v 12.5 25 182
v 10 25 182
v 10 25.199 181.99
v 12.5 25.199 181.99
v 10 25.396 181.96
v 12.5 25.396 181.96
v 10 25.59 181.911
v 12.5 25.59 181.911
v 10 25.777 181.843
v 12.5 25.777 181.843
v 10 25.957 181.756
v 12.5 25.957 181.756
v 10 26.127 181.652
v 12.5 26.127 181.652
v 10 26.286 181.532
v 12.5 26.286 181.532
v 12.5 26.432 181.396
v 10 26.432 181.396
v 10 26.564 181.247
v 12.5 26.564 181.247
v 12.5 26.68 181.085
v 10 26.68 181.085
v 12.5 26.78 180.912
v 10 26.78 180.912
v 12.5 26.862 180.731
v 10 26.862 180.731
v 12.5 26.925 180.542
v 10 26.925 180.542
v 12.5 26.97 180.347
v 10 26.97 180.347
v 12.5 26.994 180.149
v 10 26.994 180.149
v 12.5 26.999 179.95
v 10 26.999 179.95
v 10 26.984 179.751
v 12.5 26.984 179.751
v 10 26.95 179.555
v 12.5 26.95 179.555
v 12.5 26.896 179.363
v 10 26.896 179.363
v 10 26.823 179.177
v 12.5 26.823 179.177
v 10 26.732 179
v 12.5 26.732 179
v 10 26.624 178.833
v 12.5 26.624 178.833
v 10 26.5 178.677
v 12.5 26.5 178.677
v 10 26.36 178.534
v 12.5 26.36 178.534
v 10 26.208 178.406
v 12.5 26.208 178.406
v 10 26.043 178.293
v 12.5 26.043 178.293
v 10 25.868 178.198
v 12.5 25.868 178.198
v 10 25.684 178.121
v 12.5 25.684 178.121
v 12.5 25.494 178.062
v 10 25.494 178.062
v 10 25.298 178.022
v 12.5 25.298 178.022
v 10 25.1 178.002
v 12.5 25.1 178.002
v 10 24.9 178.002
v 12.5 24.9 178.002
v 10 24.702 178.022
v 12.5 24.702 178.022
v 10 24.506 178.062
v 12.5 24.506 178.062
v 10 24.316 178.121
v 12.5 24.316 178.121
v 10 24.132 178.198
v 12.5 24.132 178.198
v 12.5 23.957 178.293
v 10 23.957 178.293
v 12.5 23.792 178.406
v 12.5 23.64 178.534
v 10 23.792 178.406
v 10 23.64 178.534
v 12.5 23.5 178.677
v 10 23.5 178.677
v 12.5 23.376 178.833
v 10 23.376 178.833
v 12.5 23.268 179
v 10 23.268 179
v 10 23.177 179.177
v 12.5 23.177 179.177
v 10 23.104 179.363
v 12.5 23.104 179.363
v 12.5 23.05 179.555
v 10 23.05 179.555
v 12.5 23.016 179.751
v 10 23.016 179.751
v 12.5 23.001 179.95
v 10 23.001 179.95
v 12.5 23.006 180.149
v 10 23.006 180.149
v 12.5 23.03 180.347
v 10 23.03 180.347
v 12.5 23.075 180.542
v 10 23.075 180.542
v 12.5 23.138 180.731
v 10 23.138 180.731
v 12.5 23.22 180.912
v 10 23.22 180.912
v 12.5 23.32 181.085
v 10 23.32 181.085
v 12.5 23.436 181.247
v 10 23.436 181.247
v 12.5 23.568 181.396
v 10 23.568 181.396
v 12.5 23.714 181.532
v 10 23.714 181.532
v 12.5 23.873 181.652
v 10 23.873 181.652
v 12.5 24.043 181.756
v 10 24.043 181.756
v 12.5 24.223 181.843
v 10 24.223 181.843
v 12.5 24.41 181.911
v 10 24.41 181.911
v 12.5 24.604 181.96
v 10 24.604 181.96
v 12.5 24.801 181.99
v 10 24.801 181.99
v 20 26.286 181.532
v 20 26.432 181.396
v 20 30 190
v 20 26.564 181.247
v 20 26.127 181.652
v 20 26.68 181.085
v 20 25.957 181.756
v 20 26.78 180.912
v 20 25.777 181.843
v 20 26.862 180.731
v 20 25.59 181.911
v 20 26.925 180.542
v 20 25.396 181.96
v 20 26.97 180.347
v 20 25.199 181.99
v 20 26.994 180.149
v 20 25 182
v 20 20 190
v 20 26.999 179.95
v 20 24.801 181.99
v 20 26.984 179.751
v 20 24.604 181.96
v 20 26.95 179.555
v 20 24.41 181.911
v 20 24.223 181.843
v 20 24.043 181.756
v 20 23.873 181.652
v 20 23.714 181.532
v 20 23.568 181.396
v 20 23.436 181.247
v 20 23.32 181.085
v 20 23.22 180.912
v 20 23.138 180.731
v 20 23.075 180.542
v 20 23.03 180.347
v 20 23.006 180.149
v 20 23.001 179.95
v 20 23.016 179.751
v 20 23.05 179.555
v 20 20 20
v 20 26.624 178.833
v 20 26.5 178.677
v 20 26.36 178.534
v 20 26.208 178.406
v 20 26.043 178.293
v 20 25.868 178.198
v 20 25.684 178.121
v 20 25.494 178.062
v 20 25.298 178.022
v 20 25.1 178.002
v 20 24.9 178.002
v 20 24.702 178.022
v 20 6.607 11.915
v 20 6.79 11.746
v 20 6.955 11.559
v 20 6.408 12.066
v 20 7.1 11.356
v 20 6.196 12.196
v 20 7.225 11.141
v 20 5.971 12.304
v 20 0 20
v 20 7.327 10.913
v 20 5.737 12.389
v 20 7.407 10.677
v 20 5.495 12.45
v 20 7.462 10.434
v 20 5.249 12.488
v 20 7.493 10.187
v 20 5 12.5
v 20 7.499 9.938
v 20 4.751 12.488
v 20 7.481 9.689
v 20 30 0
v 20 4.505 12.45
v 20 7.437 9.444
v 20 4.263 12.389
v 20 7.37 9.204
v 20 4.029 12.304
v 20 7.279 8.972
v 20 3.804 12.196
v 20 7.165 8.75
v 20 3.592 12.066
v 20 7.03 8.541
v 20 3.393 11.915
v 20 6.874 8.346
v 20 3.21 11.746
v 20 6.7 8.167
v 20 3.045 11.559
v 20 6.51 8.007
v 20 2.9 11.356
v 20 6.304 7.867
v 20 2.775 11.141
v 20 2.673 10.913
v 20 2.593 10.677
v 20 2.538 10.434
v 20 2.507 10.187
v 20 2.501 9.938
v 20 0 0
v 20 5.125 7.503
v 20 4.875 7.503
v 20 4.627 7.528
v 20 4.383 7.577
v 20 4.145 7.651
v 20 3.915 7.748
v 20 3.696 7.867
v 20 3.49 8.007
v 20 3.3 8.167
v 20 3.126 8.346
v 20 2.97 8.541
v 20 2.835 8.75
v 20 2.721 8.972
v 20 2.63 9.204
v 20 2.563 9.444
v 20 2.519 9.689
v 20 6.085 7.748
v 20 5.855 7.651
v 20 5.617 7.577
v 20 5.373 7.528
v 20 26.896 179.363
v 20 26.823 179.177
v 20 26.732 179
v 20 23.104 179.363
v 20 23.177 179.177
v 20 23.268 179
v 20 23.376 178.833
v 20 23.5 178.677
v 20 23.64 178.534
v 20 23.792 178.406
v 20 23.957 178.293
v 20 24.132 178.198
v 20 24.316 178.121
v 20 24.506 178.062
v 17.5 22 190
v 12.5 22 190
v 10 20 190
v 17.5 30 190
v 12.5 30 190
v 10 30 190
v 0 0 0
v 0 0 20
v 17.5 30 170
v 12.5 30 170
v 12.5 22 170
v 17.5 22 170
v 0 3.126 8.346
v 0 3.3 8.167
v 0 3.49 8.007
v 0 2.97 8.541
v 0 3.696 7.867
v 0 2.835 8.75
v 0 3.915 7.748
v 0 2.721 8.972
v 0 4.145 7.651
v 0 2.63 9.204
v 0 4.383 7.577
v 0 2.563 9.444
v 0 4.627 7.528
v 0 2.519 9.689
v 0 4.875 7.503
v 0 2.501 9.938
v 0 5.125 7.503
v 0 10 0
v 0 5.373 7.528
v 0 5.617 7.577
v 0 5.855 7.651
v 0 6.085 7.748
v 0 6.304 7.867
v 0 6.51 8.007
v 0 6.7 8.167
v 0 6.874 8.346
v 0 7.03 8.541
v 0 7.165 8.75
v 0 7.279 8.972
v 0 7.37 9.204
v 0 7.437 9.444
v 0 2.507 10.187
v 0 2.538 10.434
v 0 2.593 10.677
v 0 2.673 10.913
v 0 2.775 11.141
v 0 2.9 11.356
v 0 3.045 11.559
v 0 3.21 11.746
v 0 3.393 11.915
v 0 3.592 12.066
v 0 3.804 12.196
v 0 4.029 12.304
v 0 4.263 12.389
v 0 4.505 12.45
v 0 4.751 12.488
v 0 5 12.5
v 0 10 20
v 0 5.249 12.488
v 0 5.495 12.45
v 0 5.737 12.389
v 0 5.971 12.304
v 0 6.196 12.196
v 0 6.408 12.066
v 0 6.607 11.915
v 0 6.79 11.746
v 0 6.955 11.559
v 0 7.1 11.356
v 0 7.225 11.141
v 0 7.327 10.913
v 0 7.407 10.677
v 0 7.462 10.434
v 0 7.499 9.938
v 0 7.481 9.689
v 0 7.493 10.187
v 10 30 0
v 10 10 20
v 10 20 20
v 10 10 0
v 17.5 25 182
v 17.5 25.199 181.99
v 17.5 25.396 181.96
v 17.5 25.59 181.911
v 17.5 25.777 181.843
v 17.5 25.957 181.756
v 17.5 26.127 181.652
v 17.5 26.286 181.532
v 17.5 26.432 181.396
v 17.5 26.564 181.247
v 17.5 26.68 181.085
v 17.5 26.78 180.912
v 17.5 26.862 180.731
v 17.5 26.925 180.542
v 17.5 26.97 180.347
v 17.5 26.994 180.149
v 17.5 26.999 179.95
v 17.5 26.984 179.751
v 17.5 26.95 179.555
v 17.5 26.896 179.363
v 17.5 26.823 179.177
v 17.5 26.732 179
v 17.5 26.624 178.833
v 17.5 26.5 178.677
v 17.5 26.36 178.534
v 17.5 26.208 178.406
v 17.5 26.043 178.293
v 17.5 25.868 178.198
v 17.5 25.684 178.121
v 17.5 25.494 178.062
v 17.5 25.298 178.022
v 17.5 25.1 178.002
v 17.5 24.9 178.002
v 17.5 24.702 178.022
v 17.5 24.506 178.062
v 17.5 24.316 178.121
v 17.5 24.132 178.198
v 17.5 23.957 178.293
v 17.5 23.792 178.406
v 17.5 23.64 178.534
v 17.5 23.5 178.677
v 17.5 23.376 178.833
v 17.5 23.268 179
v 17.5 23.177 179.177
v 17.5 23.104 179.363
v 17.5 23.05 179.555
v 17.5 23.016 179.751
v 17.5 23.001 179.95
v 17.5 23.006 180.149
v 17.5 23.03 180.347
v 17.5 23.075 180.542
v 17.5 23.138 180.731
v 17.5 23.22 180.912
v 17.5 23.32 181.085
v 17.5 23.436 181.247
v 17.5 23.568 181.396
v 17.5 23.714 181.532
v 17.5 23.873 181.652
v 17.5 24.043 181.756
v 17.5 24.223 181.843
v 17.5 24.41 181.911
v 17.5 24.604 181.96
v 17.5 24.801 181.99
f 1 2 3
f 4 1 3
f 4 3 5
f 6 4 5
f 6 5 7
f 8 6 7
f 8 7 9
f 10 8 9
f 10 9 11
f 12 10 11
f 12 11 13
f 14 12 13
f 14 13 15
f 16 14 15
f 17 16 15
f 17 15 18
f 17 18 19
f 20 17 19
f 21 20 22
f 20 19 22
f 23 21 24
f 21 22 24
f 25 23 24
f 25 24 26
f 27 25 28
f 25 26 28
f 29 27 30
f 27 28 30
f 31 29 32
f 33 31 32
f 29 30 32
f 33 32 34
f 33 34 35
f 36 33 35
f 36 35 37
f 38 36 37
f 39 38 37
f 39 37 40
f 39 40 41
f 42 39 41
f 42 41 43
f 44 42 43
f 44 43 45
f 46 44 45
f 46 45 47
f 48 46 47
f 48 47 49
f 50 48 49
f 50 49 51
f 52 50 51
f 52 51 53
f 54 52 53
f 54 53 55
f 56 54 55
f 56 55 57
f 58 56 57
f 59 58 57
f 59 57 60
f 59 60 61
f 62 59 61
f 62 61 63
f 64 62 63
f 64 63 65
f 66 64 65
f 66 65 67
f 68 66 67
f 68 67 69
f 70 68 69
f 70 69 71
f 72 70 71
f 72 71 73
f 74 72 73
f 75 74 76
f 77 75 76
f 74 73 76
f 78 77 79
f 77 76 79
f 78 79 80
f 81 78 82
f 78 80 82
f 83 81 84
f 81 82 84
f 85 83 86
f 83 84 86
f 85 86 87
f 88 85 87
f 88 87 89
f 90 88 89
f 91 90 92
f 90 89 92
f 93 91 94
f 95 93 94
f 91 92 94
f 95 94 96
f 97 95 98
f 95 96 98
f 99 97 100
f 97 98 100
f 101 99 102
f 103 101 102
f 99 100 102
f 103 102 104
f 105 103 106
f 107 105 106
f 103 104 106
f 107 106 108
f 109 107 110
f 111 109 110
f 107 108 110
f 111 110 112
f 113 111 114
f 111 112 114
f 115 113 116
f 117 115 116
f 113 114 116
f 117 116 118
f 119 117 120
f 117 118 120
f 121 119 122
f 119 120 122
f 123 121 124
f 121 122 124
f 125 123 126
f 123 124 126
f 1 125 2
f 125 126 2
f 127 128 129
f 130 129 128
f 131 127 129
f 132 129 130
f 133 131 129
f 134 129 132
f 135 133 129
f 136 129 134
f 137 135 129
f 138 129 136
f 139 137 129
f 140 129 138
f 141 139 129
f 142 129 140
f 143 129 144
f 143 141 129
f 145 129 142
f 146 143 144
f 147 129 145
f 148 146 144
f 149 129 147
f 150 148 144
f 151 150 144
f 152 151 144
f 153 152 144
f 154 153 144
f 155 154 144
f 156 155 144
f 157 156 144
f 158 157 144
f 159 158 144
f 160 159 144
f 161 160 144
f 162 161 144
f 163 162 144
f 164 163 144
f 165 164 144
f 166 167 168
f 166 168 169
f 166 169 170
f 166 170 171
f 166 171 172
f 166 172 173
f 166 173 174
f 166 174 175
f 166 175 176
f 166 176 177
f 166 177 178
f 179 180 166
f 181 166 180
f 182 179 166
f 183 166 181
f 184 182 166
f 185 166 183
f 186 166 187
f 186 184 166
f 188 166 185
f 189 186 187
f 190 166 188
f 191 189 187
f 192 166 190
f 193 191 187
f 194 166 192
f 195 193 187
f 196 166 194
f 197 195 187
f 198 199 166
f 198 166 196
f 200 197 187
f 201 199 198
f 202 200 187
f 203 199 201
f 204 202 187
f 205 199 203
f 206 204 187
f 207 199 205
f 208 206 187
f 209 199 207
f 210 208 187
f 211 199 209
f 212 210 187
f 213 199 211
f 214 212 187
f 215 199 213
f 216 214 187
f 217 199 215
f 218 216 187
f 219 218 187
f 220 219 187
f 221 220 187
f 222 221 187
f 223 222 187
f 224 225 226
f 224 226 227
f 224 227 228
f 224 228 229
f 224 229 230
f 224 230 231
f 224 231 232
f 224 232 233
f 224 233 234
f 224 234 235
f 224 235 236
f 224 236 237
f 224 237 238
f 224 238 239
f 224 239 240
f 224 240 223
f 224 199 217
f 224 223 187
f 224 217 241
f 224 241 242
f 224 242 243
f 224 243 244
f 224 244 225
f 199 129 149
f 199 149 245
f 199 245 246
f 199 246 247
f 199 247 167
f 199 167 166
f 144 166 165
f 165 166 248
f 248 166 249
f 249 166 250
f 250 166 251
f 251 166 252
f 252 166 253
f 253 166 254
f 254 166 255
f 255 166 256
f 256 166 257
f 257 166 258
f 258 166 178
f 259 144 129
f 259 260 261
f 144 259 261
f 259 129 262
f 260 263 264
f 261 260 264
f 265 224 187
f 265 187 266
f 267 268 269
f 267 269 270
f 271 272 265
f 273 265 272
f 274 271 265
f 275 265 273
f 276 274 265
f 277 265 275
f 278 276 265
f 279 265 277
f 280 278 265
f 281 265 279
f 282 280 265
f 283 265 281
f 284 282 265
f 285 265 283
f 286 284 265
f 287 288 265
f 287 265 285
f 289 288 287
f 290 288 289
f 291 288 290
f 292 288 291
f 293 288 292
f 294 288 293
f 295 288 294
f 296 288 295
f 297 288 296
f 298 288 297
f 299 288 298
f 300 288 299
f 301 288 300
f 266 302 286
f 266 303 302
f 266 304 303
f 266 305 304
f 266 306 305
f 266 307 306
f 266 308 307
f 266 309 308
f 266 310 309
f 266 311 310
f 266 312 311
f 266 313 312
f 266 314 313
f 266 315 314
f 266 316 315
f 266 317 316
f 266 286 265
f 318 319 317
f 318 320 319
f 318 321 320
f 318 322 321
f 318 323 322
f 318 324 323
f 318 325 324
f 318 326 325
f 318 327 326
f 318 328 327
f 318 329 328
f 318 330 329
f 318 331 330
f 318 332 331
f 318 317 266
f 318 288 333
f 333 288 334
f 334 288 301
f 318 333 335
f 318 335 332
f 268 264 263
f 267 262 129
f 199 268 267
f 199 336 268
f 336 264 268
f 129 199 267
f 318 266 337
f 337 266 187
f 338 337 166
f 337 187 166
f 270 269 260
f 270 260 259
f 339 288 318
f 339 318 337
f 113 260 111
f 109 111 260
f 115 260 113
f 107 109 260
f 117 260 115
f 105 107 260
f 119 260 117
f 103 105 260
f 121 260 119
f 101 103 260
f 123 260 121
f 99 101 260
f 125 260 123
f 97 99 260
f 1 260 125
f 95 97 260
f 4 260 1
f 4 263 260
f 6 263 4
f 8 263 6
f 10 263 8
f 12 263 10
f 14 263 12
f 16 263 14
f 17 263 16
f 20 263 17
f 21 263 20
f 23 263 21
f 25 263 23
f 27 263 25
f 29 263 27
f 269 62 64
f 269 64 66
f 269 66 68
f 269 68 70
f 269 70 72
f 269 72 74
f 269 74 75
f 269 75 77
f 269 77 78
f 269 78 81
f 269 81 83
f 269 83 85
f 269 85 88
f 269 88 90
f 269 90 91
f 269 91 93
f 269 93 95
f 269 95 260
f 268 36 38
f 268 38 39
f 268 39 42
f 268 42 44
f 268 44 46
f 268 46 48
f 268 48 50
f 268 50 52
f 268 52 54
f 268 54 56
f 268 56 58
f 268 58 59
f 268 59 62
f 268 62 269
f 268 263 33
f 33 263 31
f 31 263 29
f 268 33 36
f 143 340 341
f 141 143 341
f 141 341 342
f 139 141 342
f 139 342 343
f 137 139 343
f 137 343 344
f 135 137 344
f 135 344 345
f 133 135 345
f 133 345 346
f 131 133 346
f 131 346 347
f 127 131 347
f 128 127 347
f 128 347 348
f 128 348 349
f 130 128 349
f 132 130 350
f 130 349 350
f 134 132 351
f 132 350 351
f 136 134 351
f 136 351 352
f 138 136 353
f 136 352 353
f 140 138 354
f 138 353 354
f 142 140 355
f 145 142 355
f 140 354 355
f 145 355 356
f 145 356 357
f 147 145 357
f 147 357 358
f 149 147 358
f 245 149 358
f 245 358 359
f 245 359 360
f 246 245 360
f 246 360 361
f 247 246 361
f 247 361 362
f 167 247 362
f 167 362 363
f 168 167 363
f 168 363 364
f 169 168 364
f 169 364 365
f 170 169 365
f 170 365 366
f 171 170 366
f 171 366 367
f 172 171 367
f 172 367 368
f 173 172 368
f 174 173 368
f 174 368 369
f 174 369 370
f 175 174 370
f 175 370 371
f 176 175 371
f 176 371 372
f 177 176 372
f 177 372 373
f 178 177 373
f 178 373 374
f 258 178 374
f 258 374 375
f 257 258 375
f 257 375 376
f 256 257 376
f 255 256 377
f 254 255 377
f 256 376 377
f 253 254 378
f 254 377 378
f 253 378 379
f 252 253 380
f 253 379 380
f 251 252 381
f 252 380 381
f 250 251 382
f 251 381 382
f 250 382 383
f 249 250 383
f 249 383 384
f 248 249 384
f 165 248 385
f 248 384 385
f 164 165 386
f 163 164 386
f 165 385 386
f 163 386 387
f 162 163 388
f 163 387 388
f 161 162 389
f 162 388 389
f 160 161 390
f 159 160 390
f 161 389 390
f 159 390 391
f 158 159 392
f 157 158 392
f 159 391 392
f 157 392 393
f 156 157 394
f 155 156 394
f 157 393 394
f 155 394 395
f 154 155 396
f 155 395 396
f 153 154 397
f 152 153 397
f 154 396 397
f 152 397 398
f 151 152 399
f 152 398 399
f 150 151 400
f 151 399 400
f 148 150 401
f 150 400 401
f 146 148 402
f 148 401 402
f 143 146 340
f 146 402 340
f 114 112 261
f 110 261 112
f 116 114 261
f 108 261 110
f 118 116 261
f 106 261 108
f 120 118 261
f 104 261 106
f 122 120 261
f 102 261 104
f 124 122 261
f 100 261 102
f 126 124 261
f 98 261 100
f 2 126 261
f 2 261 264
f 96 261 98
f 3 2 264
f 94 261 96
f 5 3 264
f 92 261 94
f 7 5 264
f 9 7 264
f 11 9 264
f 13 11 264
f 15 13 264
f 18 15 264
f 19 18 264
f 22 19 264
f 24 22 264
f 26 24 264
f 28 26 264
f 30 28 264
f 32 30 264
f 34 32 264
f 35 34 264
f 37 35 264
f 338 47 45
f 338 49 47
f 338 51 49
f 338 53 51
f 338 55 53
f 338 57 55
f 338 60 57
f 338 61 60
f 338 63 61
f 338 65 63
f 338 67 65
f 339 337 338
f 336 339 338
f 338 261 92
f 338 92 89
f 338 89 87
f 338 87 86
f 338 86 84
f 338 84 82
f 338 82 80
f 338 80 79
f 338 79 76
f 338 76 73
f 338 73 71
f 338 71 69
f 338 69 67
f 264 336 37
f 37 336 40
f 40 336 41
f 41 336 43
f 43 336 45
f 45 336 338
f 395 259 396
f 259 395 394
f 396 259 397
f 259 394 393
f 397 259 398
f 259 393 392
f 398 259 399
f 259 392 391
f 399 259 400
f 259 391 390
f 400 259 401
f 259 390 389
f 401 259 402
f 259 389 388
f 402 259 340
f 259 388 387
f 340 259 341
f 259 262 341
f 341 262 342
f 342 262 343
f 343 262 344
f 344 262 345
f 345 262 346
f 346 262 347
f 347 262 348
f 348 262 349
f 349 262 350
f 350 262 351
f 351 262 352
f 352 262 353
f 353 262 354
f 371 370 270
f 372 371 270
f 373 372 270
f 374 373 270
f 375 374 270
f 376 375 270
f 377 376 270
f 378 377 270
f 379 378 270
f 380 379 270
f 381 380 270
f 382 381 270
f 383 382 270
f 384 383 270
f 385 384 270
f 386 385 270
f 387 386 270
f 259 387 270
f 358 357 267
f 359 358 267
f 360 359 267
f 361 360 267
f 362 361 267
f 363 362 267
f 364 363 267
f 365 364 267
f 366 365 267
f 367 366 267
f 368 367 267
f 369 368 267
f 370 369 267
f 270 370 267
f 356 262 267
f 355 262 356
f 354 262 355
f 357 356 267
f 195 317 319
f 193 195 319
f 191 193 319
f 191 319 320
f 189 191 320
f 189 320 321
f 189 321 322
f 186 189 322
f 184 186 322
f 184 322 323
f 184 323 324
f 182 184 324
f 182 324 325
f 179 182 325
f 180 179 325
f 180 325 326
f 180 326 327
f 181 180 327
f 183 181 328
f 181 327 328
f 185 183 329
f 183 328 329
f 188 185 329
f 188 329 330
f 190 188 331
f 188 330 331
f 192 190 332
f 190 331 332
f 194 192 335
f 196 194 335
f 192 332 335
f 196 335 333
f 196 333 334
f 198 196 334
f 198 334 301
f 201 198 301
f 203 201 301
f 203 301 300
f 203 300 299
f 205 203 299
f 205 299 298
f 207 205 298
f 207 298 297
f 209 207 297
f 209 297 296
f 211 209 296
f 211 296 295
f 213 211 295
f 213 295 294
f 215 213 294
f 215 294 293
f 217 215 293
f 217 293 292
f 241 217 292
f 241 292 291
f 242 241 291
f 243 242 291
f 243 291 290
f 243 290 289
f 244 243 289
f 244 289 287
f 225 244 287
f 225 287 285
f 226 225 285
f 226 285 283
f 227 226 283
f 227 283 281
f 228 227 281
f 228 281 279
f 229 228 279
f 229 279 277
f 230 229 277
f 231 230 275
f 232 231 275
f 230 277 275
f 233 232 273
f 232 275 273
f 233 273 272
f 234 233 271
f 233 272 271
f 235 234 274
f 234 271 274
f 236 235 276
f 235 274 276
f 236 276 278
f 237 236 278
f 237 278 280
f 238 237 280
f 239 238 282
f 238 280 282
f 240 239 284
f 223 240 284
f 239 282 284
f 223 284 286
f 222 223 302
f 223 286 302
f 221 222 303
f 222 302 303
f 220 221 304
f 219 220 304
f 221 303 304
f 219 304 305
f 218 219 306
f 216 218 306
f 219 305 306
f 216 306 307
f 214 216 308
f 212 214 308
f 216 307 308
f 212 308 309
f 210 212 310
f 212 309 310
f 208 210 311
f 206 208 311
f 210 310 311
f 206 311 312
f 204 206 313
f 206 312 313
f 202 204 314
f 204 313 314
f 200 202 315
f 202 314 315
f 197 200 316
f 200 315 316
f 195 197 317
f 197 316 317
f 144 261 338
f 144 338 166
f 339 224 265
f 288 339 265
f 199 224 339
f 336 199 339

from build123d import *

# Parameters (mm, degrees)
BOSS_EXTRUDE1_DEPTH = 190
SKETCH3_W           = 10
SKETCH3_H           = 170
CUT_EXTRUDE2_DEPTH  = 20
SKETCH4_W           = 170
SKETCH4_H           = 10
CUT_EXTRUDE3_DEPTH  = 20
SKETCH5_R           = 2.75
CUT_EXTRUDE4_DEPTH  = 10
SKETCH6_W           = 5
SKETCH6_H           = 20
CUT_EXTRUDE5_DEPTH  = 5
BOSS_EXTRUDE2_REACH = 195.391
SKETCH9_R           = 2.75
SKETCH9_R_2         = 2.5
SKETCH10_R          = 2.5
CUT_EXTRUDE6_DEPTH  = 194.390796058
SKETCH11_W          = 5
SKETCH11_H          = 20
CUT_EXTRUDE7_DEPTH  = 3
SKETCH12_R          = 2
CUT_EXTRUDE8_DEPTH  = 193.613602843


with BuildPart() as part:
    # Sketch2 → Boss-Extrude1 (new body)
    with BuildSketch(Plane.XY):
        Polygon((0, 0), (0, 10), (10, 10), (10, 30), (20, 30), (20, 0), align=None)
    extrude(amount=BOSS_EXTRUDE1_DEPTH)

    # Sketch3 → Cut-Extrude2 (cut)
    with BuildSketch(Plane.XZ):
        with Locations((15, 105)):
            Rectangle(SKETCH3_W, SKETCH3_H)
    extrude(amount=-CUT_EXTRUDE2_DEPTH, mode=Mode.SUBTRACT)

    # Sketch4 → Cut-Extrude3 (cut)
    with BuildSketch(Plane(origin=(10, 0, 0), x_dir=(0, 0, -1), z_dir=(1, 0, 0))):
        with Locations((-105, 5)):
            Rectangle(SKETCH4_W, SKETCH4_H)
    extrude(amount=-CUT_EXTRUDE3_DEPTH, mode=Mode.SUBTRACT)

    # Sketch5 → Cut-Extrude4 (cut)
    with BuildSketch(Plane.ZY):
        with Locations((10, 5)):
            Circle(SKETCH5_R)
    extrude(amount=-CUT_EXTRUDE4_DEPTH, mode=Mode.SUBTRACT)

    # Sketch6 → Cut-Extrude5 (cut)
    with BuildSketch(Plane(origin=(0, 30, 0), x_dir=(1, 0, 0), z_dir=(0, 1, 0))):
        with Locations((15, -180)):
            Rectangle(SKETCH6_W, SKETCH6_H)
    extrude(amount=-CUT_EXTRUDE5_DEPTH, mode=Mode.SUBTRACT)

    # Sketch9 → Boss-Extrude2 (add, up to next)
    with BuildSketch(Plane.ZY, mode=Mode.PRIVATE) as boss_extrude2_sk1:
        with Locations((10, 5)):
            Circle(SKETCH9_R)
        with Locations((10, 5)):
            Circle(SKETCH9_R_2, mode=Mode.SUBTRACT)
    boss_extrude2_tool1 = extrude(boss_extrude2_sk1.sketch, amount=-BOSS_EXTRUDE2_REACH, mode=Mode.PRIVATE) - part.part
    add(boss_extrude2_tool1.solids().sort_by_distance((0, 5, 7.327782))[0])

    # Sketch10 → Cut-Extrude6 (cut, through all)
    with BuildSketch(Plane.ZY):
        with Locations((10, 5)):
            Circle(SKETCH10_R)
    extrude(amount=-CUT_EXTRUDE6_DEPTH, mode=Mode.SUBTRACT)

    # Sketch11 → Cut-Extrude7 (cut)
    with BuildSketch(Plane(origin=(0, 25, 0), x_dir=(1, 0, 0), z_dir=(0, 1, 0))):
        with Locations((15, -180)):
            Rectangle(SKETCH11_W, SKETCH11_H)
    extrude(amount=-CUT_EXTRUDE7_DEPTH, mode=Mode.SUBTRACT)

    # Sketch12 → Cut-Extrude8 (cut, through all)
    with BuildSketch(Plane.ZY.offset(-10)):
        with Locations((180, 25)):
            Circle(SKETCH12_R)
    extrude(amount=-CUT_EXTRUDE8_DEPTH, mode=Mode.SUBTRACT)


solid = part.part
